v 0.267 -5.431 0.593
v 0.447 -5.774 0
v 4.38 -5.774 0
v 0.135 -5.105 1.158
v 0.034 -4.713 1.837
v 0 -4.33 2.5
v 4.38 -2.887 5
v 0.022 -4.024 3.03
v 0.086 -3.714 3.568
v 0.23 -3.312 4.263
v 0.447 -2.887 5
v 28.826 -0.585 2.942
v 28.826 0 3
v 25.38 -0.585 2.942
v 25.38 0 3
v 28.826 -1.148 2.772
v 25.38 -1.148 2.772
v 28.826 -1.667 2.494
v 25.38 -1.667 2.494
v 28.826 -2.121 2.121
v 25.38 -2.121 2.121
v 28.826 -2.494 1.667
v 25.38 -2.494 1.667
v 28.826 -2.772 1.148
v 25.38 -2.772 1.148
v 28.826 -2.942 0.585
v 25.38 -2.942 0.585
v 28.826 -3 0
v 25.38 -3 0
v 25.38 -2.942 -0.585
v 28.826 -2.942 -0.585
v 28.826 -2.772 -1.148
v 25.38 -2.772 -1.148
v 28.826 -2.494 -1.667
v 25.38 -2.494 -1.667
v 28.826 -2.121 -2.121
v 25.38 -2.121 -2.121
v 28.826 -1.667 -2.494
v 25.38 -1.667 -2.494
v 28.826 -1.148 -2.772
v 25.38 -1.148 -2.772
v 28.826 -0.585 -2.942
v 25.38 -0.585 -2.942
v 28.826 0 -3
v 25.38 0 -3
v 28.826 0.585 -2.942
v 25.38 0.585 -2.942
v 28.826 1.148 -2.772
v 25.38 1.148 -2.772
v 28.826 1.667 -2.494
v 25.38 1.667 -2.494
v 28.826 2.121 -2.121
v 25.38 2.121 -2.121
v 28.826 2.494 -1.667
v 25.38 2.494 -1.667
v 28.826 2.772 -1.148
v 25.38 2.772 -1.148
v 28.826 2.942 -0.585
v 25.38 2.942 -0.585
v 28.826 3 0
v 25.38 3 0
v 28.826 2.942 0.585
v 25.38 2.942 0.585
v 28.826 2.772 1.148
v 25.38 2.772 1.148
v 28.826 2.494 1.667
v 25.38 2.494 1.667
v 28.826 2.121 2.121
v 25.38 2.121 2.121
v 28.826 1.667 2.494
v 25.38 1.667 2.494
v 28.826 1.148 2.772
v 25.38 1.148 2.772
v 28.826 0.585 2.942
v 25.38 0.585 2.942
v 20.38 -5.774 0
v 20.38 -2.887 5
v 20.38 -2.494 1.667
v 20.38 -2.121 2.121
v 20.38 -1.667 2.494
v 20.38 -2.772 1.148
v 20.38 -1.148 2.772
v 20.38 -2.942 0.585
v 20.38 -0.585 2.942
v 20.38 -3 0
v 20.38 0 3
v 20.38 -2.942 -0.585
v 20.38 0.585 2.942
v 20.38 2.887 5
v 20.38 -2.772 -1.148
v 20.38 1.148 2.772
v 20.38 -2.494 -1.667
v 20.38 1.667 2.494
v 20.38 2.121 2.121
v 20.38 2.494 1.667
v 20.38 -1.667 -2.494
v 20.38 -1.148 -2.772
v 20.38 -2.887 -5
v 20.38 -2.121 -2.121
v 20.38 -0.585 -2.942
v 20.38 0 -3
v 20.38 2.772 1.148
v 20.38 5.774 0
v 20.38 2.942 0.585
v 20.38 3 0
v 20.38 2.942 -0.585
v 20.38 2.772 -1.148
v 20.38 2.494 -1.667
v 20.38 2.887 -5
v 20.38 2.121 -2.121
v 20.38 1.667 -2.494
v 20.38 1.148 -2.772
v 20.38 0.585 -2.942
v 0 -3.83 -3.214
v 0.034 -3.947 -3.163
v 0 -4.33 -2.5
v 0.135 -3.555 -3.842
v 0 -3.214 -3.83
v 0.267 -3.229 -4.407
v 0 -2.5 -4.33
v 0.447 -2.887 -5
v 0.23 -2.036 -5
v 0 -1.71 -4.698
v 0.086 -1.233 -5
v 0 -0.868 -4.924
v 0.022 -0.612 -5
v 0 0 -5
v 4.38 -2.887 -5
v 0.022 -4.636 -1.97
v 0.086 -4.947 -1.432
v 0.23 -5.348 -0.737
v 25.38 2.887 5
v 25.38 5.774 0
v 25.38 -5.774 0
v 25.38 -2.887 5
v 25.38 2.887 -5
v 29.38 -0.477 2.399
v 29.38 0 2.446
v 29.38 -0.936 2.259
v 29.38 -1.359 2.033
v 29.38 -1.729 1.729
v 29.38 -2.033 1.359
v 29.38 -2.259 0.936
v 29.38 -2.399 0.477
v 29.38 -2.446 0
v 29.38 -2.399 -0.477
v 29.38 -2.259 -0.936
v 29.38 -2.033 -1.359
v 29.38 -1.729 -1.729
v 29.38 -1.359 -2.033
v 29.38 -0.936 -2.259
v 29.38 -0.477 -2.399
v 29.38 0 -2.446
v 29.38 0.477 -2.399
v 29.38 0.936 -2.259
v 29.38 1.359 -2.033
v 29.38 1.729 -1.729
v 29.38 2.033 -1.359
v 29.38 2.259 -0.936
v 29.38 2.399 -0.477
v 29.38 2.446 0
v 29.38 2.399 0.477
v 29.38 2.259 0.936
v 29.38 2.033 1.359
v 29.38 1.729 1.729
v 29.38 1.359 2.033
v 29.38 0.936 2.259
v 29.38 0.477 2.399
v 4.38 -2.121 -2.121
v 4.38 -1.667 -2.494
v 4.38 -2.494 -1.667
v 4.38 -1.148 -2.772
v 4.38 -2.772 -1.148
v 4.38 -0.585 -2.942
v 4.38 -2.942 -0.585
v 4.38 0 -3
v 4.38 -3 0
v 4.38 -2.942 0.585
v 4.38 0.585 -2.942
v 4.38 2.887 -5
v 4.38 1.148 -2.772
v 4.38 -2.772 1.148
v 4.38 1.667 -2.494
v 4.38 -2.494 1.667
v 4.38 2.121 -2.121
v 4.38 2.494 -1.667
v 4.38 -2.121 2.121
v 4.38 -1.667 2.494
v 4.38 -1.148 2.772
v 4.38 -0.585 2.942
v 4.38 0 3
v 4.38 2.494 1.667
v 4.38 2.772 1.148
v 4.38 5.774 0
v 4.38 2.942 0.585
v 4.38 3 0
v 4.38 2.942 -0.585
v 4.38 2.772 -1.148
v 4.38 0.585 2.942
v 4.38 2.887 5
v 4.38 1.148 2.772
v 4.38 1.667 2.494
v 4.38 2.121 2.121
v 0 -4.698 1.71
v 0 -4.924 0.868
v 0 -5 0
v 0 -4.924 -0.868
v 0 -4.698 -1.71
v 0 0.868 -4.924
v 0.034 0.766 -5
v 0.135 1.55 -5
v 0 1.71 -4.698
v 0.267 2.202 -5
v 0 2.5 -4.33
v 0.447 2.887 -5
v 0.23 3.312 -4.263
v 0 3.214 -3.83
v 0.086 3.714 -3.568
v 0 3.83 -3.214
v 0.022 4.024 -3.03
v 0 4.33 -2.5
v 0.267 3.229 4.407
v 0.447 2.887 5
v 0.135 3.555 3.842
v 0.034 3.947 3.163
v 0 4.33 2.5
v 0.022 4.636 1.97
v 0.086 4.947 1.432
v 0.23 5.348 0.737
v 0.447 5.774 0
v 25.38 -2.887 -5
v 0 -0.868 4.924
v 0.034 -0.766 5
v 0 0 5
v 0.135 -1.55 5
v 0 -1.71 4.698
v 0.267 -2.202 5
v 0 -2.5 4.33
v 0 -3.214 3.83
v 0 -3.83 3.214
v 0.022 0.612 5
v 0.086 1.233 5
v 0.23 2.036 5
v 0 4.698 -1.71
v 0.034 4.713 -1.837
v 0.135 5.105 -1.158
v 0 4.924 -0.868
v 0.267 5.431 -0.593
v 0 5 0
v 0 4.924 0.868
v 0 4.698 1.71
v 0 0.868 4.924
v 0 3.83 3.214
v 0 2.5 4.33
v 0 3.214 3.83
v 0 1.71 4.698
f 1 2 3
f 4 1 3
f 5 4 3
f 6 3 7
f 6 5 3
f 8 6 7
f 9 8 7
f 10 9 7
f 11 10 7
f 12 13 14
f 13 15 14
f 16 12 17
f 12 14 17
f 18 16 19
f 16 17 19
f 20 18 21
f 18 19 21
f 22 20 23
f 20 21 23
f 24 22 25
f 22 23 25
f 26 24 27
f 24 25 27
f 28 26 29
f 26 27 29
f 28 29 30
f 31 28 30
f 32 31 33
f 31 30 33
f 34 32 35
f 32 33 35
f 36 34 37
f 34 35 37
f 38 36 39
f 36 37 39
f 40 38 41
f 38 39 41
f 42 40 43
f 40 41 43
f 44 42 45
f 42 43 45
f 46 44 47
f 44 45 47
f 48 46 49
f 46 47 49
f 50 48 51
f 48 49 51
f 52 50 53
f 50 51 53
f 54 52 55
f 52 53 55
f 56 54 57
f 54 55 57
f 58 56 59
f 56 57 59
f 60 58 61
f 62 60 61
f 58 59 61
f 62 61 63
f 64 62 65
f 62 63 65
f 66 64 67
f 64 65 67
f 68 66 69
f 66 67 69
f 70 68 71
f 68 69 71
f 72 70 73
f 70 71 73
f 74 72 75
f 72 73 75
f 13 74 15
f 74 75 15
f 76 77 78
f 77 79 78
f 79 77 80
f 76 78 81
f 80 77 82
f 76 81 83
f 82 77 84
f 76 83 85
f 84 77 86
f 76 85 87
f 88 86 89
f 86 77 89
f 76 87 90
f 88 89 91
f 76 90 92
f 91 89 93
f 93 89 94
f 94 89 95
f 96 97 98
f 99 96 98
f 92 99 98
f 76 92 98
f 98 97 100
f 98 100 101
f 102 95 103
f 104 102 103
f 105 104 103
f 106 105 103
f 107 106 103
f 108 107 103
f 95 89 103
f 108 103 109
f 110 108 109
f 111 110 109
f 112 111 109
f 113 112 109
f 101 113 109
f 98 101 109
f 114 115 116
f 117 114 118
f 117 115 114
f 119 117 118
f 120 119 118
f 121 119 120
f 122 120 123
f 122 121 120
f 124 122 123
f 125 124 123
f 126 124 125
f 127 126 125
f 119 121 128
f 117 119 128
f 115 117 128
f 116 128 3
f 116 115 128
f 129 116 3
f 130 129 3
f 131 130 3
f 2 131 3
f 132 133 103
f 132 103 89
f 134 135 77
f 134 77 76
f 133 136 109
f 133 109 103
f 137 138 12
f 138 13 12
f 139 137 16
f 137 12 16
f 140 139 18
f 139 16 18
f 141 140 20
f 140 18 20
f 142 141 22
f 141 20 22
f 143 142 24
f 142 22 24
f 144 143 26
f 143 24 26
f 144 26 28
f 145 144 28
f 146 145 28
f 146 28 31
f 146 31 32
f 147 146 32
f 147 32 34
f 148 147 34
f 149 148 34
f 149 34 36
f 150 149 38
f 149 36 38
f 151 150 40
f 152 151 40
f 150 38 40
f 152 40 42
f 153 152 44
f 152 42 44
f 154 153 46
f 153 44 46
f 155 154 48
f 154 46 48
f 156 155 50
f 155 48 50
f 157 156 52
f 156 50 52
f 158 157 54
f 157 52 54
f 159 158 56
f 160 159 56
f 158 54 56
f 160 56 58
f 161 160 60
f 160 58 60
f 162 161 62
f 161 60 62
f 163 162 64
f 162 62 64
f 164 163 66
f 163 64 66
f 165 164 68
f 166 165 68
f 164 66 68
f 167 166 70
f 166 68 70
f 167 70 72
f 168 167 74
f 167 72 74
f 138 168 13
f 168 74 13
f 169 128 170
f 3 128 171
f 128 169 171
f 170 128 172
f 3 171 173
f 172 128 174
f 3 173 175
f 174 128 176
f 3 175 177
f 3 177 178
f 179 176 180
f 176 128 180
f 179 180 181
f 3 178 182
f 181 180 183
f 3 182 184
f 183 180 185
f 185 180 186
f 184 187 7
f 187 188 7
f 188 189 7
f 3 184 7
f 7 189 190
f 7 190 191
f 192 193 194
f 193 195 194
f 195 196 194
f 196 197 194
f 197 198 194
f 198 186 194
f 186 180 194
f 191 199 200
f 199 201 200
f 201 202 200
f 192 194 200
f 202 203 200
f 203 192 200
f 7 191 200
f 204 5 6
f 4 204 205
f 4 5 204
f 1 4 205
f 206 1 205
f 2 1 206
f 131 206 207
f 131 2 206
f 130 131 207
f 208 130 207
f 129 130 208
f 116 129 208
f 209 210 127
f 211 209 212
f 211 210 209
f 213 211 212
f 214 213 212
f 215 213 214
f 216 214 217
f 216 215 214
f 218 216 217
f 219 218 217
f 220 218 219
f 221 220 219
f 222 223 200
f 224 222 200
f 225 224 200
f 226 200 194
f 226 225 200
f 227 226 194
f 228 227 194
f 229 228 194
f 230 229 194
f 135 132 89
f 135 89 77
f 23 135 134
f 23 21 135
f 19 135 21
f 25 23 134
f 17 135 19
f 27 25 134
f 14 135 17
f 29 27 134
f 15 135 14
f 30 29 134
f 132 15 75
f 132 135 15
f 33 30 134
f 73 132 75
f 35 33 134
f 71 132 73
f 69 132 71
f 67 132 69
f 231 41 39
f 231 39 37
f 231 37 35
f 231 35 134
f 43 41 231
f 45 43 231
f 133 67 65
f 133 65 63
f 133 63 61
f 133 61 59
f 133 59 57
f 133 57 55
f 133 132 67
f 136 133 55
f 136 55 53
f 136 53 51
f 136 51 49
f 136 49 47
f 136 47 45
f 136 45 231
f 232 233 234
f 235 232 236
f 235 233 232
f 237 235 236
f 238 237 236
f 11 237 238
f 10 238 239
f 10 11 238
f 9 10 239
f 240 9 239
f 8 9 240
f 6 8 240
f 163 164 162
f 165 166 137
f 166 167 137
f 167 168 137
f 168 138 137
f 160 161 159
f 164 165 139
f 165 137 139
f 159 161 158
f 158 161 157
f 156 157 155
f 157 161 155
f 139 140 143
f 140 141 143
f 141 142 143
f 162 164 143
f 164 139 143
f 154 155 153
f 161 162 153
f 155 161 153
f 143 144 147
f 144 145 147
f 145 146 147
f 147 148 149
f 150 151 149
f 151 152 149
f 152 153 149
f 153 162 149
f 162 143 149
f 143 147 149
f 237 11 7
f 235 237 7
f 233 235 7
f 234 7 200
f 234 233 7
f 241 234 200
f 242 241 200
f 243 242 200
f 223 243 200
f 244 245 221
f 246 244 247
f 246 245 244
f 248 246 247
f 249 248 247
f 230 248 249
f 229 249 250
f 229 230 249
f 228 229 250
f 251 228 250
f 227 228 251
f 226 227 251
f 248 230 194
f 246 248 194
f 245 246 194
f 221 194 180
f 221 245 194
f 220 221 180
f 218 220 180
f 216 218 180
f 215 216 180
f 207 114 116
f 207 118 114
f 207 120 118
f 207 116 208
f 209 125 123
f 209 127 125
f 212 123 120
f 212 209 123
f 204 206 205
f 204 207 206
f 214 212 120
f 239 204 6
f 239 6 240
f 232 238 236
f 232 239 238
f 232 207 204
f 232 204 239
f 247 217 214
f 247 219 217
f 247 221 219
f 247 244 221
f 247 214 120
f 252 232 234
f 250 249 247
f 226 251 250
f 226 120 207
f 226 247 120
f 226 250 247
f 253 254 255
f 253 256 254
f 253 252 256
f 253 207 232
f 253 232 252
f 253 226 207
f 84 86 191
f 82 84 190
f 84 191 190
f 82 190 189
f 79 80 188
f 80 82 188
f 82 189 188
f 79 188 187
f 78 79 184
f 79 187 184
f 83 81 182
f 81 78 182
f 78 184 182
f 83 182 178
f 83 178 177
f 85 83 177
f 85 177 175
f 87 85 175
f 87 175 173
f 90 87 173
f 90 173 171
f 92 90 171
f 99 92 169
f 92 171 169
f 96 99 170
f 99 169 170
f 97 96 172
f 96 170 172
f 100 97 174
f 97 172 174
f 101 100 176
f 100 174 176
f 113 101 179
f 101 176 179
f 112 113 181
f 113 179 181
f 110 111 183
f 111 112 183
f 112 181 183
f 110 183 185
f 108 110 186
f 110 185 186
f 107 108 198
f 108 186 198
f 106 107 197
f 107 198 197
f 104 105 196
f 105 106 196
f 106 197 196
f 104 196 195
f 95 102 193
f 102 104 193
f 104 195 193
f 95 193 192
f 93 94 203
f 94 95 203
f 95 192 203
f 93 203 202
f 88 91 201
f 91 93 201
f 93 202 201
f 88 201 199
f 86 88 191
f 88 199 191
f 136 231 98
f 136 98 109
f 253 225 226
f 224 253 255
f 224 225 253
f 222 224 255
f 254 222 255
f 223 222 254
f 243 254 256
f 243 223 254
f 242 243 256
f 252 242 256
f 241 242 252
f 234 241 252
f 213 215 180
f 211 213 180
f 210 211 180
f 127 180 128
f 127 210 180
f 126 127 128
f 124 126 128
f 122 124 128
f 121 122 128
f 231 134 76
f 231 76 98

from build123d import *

# Parameters (mm, degrees)
BASEHEAD_DEPTH      = 4.38
BOSS_EXTRUDE1_DEPTH = 5


with BuildPart() as part:
    # Sketch1 → BaseHead (new body)
    with BuildSketch(Plane(origin=(0, 0, 0), x_dir=(0, 0, -1), z_dir=(1, 0, 0))):
        Polygon((5, 2.886751346), (5, -2.886751346), (0, -5.773502692), (-5, -2.886751346), (-5, 2.886751346), (0, 5.773502692), align=None)
    extrude(amount=BASEHEAD_DEPTH)

    # BodySke → BaseBody (revolve)
    with BuildSketch(Plane.XY, mode=Mode.PRIVATE) as basebody_sk:
        Polygon((0, 0), (29.38, 0), (29.38, 2.4455), (28.8255, 3), (0, 3), align=None)
    revolve(basebody_sk.sketch.rotate(Axis((0, 0, 0), (1, 0, 0)), 90), axis=Axis((0, 0, 0), (1, 0, 0)))

    # Sketch3 → HeadChamfer (revolve, cut)
    with BuildSketch(Plane.XY):
        Polygon((0, 5), (3.333333333, 10.773502692), (3.333333333, 15.773502692), (-10, 15.773502692), (-10, 5), align=None)
    revolve(axis=Axis((0, 0, 0), (1, 0, 0)), mode=Mode.SUBTRACT)

    # Sketch4 → Boss-Extrude1 (add)
    with BuildSketch(Plane(origin=(25.38, 0, 0), x_dir=(0, 0, -1), z_dir=(1, 0, 0))):
        Polygon((0, 5.773502692), (-5, 2.886751346), (-5, -2.886751346), (0, -5.773502692), (5, -2.886751346), (5, 2.886751346), align=None)
    extrude(amount=-BOSS_EXTRUDE1_DEPTH)


solid = part.part
